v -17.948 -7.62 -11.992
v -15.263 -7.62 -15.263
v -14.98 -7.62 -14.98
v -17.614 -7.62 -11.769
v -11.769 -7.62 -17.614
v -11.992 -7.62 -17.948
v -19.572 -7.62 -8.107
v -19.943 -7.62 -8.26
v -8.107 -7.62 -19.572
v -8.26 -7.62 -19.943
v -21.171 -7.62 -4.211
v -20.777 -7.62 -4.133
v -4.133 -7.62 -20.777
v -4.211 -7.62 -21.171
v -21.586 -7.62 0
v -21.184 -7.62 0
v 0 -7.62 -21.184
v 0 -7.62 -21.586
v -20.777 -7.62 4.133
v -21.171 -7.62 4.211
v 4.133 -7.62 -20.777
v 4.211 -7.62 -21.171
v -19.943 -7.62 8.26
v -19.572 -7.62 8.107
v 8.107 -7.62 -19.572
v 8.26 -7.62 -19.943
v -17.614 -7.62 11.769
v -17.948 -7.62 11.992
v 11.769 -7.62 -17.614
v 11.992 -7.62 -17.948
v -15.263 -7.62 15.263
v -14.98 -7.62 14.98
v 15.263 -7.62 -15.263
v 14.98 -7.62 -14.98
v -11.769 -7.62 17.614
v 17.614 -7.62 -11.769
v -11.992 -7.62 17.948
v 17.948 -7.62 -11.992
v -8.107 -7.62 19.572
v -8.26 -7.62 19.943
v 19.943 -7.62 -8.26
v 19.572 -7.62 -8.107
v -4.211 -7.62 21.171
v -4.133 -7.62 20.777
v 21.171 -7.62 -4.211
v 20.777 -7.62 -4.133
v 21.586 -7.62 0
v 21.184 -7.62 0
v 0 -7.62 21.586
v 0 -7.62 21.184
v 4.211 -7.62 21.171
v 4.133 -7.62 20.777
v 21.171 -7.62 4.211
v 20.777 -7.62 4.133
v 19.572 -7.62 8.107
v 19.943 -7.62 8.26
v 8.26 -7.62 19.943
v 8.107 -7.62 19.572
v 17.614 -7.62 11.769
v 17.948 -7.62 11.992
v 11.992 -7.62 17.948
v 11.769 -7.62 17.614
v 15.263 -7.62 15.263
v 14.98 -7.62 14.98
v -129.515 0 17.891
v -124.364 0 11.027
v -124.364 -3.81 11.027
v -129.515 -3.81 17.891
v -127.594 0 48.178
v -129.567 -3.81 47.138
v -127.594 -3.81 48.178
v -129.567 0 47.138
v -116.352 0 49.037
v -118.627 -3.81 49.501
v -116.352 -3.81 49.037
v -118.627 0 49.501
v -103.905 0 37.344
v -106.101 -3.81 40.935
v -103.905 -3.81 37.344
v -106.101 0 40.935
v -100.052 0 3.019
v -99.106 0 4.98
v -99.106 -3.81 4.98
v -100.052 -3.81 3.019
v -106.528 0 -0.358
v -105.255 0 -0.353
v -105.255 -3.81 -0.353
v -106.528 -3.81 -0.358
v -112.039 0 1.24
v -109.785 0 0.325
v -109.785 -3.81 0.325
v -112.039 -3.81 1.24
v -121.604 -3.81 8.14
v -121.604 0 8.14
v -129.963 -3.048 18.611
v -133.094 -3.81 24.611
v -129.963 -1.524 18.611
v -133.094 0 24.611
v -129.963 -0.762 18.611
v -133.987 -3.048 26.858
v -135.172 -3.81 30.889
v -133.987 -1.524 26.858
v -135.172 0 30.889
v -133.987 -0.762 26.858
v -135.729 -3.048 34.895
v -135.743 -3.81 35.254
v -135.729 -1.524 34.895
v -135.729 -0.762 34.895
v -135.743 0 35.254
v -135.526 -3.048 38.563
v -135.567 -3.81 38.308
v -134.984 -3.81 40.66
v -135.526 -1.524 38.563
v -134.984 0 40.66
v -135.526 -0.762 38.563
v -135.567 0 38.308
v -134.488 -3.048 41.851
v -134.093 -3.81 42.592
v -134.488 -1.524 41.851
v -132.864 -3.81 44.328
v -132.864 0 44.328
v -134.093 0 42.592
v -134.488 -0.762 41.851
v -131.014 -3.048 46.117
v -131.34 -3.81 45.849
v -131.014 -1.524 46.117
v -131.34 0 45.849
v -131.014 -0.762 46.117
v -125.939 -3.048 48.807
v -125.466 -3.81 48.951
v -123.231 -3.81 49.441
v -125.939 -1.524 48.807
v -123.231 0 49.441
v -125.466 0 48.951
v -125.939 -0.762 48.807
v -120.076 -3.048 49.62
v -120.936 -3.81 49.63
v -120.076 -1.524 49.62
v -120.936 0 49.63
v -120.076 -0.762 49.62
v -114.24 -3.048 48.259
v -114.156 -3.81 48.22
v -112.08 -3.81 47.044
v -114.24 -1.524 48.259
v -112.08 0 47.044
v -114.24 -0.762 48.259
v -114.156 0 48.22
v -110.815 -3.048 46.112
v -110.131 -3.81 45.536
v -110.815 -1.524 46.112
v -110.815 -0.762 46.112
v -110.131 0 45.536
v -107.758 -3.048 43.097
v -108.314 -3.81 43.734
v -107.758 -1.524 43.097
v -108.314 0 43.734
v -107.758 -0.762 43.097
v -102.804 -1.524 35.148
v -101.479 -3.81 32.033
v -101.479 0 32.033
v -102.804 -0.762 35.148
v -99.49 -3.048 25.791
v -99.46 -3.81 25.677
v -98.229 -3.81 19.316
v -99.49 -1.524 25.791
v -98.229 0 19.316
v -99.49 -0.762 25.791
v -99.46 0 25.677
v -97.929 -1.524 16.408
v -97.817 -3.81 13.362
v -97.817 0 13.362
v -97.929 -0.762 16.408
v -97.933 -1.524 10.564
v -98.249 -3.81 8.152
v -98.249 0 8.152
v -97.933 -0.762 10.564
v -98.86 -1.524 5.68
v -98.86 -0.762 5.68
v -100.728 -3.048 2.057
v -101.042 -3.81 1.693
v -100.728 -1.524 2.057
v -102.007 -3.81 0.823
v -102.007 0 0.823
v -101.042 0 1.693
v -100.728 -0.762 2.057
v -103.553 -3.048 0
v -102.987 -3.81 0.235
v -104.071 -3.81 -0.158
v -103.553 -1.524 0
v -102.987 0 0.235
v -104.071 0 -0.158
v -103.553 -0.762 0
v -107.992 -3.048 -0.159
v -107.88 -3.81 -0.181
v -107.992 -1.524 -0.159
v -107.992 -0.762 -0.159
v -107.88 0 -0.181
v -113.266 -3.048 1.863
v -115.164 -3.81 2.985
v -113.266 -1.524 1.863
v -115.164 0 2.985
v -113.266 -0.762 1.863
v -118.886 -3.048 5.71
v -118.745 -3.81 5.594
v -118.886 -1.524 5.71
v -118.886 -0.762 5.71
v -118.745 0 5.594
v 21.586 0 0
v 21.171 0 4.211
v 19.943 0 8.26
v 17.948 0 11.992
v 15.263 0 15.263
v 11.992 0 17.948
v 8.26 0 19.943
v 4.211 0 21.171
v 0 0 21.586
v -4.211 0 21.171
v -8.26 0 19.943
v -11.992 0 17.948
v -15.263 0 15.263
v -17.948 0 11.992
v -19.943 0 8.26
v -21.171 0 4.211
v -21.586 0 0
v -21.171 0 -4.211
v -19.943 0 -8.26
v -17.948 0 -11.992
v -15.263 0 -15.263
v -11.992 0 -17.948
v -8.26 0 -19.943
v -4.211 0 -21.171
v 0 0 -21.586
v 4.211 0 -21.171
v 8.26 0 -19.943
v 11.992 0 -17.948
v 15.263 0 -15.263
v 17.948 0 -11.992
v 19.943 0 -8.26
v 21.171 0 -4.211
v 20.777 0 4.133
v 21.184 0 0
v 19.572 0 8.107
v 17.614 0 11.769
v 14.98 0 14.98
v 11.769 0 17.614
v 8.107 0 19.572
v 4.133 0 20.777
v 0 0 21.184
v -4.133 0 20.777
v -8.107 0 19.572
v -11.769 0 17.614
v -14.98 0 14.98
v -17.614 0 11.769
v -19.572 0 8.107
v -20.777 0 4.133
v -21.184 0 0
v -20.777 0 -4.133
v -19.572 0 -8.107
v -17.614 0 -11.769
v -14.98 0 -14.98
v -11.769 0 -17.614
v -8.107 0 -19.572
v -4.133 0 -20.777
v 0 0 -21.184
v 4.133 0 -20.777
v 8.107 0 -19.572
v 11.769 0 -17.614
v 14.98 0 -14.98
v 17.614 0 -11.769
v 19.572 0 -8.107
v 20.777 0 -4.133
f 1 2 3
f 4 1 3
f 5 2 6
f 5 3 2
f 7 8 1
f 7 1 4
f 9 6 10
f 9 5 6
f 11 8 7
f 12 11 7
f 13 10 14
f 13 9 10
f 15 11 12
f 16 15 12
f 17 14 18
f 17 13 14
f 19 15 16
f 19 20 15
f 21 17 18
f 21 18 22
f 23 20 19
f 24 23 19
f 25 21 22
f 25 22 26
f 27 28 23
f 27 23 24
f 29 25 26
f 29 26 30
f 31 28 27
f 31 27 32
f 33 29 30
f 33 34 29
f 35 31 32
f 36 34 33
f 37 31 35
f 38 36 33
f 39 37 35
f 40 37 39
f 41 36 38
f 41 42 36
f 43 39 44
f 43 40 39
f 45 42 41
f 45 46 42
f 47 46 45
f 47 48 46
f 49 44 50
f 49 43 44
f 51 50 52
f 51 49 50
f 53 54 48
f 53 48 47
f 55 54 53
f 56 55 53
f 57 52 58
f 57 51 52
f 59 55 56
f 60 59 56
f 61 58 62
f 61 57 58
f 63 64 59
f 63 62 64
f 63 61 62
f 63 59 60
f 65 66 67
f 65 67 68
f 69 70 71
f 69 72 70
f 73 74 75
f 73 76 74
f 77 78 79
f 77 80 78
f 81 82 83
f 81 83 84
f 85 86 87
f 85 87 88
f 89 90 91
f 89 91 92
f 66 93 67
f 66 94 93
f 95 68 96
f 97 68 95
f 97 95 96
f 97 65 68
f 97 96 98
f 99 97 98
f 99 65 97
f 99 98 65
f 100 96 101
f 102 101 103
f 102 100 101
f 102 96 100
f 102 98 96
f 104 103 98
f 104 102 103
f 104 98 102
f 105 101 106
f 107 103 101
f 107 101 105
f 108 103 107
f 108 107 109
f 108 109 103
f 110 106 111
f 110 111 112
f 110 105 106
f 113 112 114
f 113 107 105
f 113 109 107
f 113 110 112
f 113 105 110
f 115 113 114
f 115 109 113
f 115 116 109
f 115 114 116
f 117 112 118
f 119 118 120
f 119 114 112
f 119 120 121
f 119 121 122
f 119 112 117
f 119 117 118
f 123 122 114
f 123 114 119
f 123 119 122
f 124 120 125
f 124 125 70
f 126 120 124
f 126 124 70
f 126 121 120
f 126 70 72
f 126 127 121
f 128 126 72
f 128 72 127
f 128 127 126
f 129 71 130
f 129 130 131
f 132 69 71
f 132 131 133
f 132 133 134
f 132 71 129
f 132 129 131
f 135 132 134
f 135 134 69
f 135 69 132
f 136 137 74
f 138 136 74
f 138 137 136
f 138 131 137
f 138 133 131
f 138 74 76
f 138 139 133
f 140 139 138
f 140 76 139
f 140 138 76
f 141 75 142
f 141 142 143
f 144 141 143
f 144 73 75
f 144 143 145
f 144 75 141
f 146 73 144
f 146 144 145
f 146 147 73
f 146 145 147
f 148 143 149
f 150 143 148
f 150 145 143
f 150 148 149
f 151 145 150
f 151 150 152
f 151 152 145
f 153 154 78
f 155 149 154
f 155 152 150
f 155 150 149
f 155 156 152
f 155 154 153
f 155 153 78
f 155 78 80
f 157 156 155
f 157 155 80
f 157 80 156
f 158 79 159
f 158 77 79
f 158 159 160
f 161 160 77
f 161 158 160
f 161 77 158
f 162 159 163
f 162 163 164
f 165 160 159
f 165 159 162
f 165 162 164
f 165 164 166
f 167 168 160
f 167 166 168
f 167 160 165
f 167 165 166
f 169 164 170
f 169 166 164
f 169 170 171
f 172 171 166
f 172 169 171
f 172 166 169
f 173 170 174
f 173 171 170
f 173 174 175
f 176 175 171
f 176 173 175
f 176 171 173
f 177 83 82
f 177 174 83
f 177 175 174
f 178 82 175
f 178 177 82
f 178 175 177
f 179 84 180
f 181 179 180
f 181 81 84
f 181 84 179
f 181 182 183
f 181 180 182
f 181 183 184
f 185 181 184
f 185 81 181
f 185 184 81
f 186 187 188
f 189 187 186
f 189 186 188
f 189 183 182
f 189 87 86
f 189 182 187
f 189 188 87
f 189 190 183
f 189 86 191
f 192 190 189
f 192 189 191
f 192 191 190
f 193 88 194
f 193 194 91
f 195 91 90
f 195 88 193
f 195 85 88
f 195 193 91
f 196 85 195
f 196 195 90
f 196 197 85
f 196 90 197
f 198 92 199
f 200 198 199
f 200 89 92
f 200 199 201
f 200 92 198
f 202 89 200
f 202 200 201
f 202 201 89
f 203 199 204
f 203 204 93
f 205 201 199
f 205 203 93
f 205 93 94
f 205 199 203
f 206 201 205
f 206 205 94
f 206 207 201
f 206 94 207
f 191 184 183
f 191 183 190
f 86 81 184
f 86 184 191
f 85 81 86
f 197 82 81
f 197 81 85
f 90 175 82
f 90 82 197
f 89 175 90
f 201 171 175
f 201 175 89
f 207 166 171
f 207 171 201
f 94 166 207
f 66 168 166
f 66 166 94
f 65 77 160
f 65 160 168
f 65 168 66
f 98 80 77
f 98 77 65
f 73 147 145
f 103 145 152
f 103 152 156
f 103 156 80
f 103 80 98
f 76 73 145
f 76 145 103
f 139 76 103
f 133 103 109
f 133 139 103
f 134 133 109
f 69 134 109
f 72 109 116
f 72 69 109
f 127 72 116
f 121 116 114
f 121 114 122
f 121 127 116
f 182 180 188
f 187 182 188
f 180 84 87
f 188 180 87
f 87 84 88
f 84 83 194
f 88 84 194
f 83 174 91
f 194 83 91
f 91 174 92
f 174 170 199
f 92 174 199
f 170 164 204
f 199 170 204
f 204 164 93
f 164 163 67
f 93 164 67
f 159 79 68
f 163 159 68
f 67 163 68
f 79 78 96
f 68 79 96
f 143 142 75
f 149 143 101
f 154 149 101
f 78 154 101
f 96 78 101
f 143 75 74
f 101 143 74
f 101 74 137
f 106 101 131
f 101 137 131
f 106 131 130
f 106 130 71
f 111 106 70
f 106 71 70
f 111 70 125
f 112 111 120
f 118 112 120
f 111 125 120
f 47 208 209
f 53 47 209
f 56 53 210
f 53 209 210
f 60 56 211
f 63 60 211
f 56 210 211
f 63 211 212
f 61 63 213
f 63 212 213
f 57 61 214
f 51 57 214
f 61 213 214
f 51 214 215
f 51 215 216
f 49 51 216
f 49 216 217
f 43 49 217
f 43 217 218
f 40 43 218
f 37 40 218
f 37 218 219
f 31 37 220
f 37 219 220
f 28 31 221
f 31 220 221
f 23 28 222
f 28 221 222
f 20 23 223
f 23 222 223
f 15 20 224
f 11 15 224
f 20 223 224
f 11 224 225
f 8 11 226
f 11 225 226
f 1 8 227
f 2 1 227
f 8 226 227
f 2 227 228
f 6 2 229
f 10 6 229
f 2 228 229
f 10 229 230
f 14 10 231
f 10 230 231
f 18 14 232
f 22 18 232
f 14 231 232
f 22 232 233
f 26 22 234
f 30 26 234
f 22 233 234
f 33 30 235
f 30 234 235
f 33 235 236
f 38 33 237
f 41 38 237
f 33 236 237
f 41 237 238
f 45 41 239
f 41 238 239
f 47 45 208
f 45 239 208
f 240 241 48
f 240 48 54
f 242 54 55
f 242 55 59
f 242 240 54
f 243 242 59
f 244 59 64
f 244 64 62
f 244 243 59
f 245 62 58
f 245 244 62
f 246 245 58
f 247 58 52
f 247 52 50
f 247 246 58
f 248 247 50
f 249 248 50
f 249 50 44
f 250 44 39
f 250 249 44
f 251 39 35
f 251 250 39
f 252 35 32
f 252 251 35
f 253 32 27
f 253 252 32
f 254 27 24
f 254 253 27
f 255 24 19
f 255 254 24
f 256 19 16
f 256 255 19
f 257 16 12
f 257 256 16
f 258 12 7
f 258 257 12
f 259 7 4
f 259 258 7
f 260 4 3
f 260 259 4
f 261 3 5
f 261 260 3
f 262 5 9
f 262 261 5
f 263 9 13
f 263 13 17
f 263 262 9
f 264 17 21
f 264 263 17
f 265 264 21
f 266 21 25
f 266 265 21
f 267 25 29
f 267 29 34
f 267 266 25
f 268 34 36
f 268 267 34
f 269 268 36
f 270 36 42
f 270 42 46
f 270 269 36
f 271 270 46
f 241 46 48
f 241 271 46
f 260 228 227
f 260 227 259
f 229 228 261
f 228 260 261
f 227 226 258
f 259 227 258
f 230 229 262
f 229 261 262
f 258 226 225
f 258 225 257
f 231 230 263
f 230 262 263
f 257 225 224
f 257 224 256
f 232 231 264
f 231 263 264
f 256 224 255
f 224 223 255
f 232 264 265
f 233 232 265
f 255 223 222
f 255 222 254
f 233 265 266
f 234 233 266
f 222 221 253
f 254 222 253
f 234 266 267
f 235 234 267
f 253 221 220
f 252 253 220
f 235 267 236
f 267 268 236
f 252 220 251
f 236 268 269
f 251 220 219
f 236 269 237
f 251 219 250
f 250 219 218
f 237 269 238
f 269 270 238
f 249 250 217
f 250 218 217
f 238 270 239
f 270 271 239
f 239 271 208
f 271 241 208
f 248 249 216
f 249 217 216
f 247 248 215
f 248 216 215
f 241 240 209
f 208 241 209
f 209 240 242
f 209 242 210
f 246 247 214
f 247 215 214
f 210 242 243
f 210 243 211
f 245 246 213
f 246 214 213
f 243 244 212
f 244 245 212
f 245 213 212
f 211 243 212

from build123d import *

# Parameters (mm, degrees)
F0_R     = 21.5856551854
F0_R_2   = 21.1844233837
F1_DEPTH = 7.62
F3_DEPTH = 3.81


with BuildPart() as f1:
    # F0 (on Front) → F1 (new body)
    with BuildSketch(Plane.XZ):
        Circle(F0_R)
        Circle(F0_R_2, mode=Mode.SUBTRACT)
    extrude(amount=F1_DEPTH)


with BuildPart() as f3:
    # F2 (on Front) → F3 (new body)
    with BuildSketch(Plane.XZ):
        with BuildLine():
            add(Edge.make_bspline(
                [(-124.3636161089, 11.0266618431), (-132.5674827077, 20.310470601), (-143.2024234364, 44.5052323538), (-109.1272328874, 55.8077913823), (-94.7265261769, 17.515578088), (-101.2494682316, -6.063682356), (-117.3739396332, 3.1168769997), (-124.3636161089, 11.0266618431)],
                knots=[0, 0, 0, 0, 0.2251010638, 0.4072231348, 0.643626366, 0.8082143839, 1, 1, 1, 1], degree=3))
        make_face()
    extrude(amount=F3_DEPTH)


solid = Compound([f1.part, f3.part])
